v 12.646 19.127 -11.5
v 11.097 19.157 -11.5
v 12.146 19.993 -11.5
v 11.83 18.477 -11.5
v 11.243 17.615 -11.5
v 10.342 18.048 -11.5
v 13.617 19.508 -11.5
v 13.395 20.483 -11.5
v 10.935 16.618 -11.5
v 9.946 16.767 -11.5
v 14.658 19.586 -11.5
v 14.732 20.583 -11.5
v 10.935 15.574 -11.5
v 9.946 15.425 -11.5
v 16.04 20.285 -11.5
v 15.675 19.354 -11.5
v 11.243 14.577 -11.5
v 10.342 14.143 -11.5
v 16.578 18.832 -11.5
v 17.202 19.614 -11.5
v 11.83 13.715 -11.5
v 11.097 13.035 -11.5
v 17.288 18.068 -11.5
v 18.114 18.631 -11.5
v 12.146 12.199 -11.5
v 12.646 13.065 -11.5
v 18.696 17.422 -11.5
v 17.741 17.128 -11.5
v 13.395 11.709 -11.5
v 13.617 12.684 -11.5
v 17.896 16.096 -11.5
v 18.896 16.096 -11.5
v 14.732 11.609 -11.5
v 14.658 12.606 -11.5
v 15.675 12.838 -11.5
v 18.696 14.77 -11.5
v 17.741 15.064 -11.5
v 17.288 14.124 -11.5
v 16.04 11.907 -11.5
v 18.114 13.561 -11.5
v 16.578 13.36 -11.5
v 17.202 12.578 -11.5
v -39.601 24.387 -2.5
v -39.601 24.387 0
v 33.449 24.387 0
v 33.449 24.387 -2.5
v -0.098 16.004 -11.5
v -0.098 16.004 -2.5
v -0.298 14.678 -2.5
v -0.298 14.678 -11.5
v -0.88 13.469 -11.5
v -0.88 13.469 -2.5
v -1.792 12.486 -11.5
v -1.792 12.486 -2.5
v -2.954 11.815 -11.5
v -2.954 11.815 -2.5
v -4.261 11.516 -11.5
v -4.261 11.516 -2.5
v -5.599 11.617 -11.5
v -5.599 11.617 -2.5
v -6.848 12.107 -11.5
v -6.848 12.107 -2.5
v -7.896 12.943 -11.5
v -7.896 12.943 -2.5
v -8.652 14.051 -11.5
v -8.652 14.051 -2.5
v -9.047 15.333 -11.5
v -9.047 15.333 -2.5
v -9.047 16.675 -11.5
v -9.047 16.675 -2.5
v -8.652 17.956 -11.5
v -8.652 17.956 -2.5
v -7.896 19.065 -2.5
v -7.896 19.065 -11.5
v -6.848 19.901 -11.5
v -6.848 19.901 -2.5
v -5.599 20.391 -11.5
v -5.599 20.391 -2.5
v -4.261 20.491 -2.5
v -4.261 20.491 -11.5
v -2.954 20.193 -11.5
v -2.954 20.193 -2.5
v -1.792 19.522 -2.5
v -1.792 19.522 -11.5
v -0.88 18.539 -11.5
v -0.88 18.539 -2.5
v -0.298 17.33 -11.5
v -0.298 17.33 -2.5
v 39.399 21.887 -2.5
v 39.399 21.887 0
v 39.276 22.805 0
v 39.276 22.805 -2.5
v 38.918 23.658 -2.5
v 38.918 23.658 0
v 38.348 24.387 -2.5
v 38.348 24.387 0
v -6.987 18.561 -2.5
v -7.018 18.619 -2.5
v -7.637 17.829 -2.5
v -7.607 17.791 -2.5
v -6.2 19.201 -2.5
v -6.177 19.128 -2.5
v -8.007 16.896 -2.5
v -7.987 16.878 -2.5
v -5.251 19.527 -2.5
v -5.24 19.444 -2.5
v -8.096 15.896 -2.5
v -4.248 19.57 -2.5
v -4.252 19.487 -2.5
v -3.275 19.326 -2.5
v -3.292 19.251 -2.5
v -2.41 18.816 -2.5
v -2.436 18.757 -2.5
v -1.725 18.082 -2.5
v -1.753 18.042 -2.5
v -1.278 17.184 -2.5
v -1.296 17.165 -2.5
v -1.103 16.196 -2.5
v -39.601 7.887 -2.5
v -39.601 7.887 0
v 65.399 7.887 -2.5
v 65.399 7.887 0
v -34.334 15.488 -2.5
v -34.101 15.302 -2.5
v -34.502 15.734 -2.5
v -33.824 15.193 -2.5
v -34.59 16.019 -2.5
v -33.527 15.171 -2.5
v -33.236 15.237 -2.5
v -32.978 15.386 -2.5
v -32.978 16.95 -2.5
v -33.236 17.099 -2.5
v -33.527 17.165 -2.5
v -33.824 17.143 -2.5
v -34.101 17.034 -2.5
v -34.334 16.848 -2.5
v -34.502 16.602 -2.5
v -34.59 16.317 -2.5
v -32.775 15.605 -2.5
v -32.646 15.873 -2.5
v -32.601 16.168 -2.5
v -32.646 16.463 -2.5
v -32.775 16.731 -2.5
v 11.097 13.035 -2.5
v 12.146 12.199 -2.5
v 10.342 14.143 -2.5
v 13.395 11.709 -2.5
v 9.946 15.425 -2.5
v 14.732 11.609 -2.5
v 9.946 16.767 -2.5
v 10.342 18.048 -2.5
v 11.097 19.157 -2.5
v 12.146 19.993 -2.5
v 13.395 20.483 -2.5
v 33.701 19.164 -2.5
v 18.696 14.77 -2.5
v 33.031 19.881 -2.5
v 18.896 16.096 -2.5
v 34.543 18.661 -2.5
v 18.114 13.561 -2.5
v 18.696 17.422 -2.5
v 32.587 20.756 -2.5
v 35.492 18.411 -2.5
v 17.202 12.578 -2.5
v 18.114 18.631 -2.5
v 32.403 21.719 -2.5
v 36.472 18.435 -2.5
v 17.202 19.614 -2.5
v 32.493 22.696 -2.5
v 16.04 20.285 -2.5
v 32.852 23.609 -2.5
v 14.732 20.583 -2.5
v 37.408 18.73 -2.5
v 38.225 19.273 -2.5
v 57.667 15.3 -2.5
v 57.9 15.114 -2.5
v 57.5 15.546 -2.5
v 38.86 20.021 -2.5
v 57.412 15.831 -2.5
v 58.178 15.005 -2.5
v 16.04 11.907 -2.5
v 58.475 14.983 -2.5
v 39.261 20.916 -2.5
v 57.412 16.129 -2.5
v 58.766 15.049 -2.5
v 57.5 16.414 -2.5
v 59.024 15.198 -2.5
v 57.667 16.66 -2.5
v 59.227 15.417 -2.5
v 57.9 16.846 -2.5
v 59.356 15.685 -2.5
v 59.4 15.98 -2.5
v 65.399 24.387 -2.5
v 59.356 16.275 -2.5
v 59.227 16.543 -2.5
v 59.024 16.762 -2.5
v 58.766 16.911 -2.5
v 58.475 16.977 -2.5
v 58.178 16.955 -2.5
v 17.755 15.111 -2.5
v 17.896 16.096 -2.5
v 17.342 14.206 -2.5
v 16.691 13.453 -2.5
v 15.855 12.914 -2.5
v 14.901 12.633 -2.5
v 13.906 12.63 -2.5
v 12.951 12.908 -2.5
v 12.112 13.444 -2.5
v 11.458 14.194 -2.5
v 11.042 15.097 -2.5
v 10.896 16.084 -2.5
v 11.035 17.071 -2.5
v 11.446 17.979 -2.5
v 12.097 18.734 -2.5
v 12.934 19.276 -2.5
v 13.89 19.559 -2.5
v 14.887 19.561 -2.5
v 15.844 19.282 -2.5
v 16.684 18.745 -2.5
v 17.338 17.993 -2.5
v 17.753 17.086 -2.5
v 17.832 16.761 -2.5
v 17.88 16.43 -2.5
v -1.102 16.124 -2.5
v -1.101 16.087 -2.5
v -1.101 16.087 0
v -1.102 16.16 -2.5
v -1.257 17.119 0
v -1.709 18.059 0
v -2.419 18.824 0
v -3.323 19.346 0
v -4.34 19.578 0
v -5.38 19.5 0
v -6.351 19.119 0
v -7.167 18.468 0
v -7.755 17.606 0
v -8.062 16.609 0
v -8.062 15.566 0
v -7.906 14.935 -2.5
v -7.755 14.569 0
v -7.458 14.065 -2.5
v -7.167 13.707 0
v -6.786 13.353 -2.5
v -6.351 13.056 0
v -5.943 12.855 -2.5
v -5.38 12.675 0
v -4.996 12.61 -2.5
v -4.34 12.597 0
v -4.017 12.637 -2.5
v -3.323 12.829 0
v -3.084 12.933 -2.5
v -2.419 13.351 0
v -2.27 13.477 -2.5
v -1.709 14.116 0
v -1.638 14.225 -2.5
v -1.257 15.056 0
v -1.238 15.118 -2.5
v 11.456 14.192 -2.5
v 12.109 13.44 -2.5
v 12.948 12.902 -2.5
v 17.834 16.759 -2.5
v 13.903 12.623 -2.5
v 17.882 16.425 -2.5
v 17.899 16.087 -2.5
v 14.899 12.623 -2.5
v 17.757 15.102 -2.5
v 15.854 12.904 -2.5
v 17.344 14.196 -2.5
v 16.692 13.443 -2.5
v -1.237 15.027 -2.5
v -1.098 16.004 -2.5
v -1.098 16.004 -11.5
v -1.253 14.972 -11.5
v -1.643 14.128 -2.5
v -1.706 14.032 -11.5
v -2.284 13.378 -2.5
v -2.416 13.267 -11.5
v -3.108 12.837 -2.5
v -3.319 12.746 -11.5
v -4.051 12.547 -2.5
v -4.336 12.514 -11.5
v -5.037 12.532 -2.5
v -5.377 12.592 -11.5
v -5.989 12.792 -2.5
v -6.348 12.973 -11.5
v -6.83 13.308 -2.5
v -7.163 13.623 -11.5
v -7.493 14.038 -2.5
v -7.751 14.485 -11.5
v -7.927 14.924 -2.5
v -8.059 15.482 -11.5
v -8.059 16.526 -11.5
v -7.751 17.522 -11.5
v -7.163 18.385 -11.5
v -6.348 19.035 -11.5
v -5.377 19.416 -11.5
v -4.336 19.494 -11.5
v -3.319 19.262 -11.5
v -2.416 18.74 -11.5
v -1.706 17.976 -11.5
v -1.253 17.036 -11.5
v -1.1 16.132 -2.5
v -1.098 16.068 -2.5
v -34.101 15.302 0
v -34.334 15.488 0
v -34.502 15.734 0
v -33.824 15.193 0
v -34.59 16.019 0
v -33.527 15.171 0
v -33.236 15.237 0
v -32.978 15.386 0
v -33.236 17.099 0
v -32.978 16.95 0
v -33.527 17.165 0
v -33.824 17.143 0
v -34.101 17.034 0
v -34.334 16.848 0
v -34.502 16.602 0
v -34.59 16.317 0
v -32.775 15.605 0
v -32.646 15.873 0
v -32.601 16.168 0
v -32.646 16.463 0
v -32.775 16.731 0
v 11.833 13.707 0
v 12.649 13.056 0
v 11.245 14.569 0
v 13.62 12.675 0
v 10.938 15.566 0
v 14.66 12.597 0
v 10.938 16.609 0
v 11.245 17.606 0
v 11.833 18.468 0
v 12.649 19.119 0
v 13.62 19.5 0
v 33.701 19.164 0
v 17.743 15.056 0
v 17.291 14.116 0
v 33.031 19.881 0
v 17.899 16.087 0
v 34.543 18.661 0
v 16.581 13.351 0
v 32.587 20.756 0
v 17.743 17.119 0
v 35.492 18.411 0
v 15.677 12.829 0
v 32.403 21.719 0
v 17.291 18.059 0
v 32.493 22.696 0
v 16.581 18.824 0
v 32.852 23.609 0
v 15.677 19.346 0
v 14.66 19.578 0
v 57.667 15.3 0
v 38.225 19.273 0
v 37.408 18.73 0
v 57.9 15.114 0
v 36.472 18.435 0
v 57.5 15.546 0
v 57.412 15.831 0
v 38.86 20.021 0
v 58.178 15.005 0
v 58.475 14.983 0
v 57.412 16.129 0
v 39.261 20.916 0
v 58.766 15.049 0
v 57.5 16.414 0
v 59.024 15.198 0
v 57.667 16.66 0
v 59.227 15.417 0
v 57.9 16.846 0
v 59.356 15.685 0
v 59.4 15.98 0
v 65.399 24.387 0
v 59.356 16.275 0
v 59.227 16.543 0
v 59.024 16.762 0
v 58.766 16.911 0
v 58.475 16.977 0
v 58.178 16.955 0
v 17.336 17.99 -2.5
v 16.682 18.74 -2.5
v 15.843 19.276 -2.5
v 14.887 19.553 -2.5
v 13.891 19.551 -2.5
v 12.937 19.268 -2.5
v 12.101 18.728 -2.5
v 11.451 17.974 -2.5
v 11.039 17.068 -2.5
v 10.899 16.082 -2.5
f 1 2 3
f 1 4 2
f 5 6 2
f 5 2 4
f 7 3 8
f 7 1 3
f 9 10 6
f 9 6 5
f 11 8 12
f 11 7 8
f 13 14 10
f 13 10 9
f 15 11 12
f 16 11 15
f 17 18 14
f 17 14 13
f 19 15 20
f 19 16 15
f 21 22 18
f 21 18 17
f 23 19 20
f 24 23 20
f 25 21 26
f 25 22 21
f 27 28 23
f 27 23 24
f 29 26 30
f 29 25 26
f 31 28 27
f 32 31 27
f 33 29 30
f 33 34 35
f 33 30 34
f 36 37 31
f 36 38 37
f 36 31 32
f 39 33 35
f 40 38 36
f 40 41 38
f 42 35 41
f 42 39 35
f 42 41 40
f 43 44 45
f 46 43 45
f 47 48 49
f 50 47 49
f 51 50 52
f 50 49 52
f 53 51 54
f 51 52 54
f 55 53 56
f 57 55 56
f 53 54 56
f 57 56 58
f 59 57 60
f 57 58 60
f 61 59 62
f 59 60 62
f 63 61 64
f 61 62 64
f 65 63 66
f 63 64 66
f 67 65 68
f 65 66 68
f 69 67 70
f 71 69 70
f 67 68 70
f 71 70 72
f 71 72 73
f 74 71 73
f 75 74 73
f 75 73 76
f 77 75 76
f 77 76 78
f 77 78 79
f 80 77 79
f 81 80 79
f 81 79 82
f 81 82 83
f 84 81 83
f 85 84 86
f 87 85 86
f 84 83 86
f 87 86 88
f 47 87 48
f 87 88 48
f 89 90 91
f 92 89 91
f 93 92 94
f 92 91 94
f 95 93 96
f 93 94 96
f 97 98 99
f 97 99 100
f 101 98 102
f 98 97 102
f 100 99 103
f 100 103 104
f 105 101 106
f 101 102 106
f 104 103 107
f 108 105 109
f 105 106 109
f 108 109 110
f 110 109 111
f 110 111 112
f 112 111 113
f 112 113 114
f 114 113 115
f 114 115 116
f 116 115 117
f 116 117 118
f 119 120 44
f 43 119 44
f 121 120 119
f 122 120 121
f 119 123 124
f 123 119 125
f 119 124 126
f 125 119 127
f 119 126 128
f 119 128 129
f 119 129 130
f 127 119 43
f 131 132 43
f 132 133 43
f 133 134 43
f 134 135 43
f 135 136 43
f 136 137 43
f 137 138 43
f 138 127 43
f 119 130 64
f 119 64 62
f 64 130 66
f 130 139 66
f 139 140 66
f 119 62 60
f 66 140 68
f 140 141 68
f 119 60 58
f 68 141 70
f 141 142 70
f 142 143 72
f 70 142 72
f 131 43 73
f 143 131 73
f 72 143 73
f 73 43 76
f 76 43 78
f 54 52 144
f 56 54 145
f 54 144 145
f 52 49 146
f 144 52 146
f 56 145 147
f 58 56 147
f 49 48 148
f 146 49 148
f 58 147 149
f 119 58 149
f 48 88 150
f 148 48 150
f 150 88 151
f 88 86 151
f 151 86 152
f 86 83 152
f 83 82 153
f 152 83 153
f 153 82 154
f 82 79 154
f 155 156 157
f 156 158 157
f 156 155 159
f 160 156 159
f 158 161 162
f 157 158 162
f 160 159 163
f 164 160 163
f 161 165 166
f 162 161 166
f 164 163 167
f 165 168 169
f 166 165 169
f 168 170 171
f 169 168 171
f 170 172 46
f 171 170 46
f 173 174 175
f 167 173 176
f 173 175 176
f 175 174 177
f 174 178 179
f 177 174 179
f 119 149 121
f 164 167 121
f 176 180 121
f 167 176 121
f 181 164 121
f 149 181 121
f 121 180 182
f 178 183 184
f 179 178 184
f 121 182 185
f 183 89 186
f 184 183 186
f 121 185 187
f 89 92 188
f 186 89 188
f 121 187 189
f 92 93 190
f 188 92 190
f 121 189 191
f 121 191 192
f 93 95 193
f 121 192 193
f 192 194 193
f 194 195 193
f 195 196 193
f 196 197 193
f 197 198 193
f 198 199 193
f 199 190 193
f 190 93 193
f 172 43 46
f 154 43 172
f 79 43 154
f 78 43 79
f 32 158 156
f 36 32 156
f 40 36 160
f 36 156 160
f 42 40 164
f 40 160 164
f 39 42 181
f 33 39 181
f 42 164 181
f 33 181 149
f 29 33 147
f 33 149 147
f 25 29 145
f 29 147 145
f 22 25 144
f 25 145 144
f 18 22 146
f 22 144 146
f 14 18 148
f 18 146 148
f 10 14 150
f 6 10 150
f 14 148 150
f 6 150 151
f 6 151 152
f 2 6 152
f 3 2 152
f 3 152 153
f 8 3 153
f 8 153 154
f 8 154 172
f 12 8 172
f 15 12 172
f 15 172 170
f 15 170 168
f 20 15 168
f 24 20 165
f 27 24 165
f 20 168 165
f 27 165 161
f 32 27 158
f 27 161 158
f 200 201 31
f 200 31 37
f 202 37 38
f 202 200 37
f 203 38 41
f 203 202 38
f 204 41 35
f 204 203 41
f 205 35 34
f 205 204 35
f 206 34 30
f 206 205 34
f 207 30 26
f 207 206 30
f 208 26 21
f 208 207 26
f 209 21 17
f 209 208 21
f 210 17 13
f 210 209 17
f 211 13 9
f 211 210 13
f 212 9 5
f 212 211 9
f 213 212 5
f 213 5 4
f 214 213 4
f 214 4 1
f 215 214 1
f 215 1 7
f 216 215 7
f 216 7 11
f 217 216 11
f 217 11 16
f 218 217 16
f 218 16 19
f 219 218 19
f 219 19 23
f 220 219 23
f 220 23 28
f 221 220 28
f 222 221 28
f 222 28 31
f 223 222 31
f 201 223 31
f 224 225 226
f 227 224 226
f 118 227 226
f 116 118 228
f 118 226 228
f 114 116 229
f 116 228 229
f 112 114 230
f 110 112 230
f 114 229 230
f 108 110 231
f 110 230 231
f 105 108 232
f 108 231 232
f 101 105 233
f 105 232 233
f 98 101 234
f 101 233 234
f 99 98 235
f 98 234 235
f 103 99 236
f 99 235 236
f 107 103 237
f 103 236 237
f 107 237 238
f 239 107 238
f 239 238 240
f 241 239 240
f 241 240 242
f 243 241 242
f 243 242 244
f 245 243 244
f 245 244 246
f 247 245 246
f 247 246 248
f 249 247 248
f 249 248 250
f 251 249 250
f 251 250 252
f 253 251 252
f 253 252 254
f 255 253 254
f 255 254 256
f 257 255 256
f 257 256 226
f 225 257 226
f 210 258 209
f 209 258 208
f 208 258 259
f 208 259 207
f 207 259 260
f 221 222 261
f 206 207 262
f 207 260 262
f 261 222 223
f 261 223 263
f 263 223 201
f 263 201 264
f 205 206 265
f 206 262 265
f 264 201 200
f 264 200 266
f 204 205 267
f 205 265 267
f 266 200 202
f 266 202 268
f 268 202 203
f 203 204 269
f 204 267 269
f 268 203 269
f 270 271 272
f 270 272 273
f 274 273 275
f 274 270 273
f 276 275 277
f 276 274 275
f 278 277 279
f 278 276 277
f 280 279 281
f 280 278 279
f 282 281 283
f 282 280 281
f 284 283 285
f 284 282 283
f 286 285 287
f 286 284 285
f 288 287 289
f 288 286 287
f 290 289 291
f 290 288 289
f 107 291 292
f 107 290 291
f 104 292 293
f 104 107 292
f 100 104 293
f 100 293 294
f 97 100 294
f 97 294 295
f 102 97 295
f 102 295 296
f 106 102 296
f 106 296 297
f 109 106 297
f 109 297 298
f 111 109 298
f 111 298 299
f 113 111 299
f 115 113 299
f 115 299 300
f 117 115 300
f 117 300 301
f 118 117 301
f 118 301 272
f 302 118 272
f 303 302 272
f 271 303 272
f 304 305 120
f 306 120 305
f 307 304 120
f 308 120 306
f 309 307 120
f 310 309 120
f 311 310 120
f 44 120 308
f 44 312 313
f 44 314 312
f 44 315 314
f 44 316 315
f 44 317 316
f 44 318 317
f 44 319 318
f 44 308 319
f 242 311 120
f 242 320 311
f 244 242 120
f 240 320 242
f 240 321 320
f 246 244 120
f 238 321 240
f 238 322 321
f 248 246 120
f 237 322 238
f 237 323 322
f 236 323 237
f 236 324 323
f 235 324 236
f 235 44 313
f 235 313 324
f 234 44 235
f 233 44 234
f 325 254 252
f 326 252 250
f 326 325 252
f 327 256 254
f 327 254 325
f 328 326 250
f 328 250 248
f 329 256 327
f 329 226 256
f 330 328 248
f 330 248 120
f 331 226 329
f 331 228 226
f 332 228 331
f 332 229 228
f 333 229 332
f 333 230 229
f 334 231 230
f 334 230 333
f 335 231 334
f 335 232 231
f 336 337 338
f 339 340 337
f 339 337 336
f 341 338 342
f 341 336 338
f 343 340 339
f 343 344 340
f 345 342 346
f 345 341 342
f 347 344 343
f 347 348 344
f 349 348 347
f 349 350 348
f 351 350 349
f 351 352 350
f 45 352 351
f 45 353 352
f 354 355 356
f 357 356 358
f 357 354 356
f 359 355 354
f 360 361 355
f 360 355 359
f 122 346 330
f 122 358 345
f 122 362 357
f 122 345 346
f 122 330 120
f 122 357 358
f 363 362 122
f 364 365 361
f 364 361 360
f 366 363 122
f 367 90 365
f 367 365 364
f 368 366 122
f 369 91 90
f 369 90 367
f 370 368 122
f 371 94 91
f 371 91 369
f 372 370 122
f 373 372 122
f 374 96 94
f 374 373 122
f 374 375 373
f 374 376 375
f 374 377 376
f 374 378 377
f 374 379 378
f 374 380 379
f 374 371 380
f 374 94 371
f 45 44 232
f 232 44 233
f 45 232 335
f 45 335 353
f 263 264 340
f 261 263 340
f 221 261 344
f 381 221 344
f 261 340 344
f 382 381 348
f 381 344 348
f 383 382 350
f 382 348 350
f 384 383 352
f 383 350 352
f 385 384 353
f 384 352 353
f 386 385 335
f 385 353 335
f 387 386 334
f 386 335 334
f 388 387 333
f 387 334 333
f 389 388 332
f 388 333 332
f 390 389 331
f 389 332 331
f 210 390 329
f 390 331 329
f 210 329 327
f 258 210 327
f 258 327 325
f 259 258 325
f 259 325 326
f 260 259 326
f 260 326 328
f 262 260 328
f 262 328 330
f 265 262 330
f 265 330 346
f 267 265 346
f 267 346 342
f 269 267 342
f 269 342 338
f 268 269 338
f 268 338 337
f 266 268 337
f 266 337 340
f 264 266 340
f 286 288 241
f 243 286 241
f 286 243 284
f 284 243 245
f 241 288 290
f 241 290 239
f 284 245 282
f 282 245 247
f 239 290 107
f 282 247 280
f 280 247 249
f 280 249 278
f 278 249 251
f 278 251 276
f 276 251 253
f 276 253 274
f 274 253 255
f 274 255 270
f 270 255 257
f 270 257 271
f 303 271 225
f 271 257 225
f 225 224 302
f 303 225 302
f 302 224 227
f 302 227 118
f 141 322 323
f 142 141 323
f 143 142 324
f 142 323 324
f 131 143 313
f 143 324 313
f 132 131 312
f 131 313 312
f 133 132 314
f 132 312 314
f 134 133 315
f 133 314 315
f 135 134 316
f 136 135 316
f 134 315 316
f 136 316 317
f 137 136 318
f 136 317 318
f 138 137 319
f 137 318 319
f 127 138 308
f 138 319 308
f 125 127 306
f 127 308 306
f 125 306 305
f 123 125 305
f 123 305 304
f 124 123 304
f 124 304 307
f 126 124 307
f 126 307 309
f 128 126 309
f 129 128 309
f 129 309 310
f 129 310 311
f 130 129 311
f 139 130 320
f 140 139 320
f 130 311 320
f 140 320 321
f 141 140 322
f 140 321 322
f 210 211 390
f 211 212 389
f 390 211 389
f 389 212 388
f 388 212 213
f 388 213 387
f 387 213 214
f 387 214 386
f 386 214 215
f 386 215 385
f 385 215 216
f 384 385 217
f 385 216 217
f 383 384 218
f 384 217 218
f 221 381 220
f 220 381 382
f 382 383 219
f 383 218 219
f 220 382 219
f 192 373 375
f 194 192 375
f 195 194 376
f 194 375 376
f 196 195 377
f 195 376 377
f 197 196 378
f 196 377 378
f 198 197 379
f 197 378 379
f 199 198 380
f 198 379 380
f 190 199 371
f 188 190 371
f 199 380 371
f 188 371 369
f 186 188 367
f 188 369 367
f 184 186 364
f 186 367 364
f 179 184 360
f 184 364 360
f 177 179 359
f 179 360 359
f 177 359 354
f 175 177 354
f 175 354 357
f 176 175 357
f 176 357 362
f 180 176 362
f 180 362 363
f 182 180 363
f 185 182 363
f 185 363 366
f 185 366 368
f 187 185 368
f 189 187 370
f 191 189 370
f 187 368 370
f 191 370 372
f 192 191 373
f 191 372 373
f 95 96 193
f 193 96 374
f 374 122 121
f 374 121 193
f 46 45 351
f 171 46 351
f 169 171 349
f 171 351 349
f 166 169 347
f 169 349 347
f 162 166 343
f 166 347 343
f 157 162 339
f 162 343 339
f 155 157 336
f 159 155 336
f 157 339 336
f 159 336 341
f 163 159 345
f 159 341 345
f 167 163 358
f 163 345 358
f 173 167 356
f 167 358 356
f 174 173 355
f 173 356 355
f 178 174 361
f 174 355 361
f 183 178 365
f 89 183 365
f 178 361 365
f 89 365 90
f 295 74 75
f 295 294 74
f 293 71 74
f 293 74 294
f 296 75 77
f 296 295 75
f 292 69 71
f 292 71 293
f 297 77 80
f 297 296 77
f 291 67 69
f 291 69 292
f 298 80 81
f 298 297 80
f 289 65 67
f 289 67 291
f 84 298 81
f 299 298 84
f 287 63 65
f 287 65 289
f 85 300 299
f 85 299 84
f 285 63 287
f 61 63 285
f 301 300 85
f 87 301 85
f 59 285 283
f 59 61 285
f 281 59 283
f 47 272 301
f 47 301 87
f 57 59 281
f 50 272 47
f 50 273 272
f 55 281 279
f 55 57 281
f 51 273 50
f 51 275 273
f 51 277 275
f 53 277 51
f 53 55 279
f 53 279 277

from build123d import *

# Parameters (mm, degrees)
F0_W       = 105
F0_H       = 16.5
F1_DEPTH   = 2.5
F2_R       = 3.5
F2_R_2     = 1
F1_FACE1_W = 105
F1_FACE1_H = 16.5
F3_DEPTH   = 2.5
F5_R       = 4.5
F5_R_2     = 3.5
F6_DEPTH   = 9
F7_DEPTH   = 9


with BuildPart() as f1:
    # F0 (on Top) → F1 (new body)
    with BuildSketch(Plane.XY):
        with Locations((12.898709625, 16.1374760096)):
            Rectangle(F0_W, F0_H)
    extrude(amount=-F1_DEPTH)

    # F2 (on face) + F1_face1 (on face) → F3 (cut)
    with BuildSketch(Plane.XY):
        with BuildLine():
            ThreePointArc((33.4492198822, 24.3874760096), (34.5428361242, 18.6607738154), (39.398709625, 21.8874760096))
            ThreePointArc((39.398709625, 21.8874760096), (39.1254118192, 23.2433495104), (38.3481993678, 24.3874760096))
            Line((38.3481993678, 24.3874760096), (33.4492198822, 24.3874760096))
        make_face()
        with Locations((-4.6013260893, 16.0874760096)):
            Circle(F2_R)
        with Locations((14.3986739107, 16.0874760096)):
            Circle(F2_R)
        with Locations((-33.6013682725, 16.1680499117)):
            Circle(F2_R_2)
        with Locations((58.4004792942, 15.9800840236)):
            Circle(F2_R_2)
    with BuildSketch(Plane(origin=(12.898709625, 16.1374760096, -2.5), x_dir=(1, 0, 0), z_dir=(0, 0, -1))):
        Rectangle(F1_FACE1_W, F1_FACE1_H)
    extrude(amount=-F3_DEPTH, dir=(0, 0, 1), mode=Mode.SUBTRACT)

    # F5 (on face) → F6 (join)
    with BuildSketch(Plane(origin=(0, 0, -2.5), x_dir=(1, 0, 0), z_dir=(0, 0, -1))):
        with Locations((-4.5977425762, -16.0039048642)):
            Circle(F5_R)
        with Locations((-4.5977425762, -16.0039048642)):
            Circle(F5_R_2, mode=Mode.SUBTRACT)
        with Locations((14.3961599097, -16.0959586501)):
            Circle(F5_R)
        with Locations((14.3961599097, -16.0959586501)):
            Circle(F5_R_2, mode=Mode.SUBTRACT)
    extrude(amount=F6_DEPTH)

    # F5 (on face) → F7 (join)
    with BuildSketch(Plane(origin=(0, 0, -2.5), x_dir=(1, 0, 0), z_dir=(0, 0, -1))):
        with Locations((-4.5977425762, -16.0039048642)):
            Circle(F5_R)
        with Locations((-4.5977425762, -16.0039048642)):
            Circle(F5_R_2, mode=Mode.SUBTRACT)
        with Locations((14.3961599097, -16.0959586501)):
            Circle(F5_R)
        with Locations((14.3961599097, -16.0959586501)):
            Circle(F5_R_2, mode=Mode.SUBTRACT)
    extrude(amount=F7_DEPTH)


solid = f1.part
